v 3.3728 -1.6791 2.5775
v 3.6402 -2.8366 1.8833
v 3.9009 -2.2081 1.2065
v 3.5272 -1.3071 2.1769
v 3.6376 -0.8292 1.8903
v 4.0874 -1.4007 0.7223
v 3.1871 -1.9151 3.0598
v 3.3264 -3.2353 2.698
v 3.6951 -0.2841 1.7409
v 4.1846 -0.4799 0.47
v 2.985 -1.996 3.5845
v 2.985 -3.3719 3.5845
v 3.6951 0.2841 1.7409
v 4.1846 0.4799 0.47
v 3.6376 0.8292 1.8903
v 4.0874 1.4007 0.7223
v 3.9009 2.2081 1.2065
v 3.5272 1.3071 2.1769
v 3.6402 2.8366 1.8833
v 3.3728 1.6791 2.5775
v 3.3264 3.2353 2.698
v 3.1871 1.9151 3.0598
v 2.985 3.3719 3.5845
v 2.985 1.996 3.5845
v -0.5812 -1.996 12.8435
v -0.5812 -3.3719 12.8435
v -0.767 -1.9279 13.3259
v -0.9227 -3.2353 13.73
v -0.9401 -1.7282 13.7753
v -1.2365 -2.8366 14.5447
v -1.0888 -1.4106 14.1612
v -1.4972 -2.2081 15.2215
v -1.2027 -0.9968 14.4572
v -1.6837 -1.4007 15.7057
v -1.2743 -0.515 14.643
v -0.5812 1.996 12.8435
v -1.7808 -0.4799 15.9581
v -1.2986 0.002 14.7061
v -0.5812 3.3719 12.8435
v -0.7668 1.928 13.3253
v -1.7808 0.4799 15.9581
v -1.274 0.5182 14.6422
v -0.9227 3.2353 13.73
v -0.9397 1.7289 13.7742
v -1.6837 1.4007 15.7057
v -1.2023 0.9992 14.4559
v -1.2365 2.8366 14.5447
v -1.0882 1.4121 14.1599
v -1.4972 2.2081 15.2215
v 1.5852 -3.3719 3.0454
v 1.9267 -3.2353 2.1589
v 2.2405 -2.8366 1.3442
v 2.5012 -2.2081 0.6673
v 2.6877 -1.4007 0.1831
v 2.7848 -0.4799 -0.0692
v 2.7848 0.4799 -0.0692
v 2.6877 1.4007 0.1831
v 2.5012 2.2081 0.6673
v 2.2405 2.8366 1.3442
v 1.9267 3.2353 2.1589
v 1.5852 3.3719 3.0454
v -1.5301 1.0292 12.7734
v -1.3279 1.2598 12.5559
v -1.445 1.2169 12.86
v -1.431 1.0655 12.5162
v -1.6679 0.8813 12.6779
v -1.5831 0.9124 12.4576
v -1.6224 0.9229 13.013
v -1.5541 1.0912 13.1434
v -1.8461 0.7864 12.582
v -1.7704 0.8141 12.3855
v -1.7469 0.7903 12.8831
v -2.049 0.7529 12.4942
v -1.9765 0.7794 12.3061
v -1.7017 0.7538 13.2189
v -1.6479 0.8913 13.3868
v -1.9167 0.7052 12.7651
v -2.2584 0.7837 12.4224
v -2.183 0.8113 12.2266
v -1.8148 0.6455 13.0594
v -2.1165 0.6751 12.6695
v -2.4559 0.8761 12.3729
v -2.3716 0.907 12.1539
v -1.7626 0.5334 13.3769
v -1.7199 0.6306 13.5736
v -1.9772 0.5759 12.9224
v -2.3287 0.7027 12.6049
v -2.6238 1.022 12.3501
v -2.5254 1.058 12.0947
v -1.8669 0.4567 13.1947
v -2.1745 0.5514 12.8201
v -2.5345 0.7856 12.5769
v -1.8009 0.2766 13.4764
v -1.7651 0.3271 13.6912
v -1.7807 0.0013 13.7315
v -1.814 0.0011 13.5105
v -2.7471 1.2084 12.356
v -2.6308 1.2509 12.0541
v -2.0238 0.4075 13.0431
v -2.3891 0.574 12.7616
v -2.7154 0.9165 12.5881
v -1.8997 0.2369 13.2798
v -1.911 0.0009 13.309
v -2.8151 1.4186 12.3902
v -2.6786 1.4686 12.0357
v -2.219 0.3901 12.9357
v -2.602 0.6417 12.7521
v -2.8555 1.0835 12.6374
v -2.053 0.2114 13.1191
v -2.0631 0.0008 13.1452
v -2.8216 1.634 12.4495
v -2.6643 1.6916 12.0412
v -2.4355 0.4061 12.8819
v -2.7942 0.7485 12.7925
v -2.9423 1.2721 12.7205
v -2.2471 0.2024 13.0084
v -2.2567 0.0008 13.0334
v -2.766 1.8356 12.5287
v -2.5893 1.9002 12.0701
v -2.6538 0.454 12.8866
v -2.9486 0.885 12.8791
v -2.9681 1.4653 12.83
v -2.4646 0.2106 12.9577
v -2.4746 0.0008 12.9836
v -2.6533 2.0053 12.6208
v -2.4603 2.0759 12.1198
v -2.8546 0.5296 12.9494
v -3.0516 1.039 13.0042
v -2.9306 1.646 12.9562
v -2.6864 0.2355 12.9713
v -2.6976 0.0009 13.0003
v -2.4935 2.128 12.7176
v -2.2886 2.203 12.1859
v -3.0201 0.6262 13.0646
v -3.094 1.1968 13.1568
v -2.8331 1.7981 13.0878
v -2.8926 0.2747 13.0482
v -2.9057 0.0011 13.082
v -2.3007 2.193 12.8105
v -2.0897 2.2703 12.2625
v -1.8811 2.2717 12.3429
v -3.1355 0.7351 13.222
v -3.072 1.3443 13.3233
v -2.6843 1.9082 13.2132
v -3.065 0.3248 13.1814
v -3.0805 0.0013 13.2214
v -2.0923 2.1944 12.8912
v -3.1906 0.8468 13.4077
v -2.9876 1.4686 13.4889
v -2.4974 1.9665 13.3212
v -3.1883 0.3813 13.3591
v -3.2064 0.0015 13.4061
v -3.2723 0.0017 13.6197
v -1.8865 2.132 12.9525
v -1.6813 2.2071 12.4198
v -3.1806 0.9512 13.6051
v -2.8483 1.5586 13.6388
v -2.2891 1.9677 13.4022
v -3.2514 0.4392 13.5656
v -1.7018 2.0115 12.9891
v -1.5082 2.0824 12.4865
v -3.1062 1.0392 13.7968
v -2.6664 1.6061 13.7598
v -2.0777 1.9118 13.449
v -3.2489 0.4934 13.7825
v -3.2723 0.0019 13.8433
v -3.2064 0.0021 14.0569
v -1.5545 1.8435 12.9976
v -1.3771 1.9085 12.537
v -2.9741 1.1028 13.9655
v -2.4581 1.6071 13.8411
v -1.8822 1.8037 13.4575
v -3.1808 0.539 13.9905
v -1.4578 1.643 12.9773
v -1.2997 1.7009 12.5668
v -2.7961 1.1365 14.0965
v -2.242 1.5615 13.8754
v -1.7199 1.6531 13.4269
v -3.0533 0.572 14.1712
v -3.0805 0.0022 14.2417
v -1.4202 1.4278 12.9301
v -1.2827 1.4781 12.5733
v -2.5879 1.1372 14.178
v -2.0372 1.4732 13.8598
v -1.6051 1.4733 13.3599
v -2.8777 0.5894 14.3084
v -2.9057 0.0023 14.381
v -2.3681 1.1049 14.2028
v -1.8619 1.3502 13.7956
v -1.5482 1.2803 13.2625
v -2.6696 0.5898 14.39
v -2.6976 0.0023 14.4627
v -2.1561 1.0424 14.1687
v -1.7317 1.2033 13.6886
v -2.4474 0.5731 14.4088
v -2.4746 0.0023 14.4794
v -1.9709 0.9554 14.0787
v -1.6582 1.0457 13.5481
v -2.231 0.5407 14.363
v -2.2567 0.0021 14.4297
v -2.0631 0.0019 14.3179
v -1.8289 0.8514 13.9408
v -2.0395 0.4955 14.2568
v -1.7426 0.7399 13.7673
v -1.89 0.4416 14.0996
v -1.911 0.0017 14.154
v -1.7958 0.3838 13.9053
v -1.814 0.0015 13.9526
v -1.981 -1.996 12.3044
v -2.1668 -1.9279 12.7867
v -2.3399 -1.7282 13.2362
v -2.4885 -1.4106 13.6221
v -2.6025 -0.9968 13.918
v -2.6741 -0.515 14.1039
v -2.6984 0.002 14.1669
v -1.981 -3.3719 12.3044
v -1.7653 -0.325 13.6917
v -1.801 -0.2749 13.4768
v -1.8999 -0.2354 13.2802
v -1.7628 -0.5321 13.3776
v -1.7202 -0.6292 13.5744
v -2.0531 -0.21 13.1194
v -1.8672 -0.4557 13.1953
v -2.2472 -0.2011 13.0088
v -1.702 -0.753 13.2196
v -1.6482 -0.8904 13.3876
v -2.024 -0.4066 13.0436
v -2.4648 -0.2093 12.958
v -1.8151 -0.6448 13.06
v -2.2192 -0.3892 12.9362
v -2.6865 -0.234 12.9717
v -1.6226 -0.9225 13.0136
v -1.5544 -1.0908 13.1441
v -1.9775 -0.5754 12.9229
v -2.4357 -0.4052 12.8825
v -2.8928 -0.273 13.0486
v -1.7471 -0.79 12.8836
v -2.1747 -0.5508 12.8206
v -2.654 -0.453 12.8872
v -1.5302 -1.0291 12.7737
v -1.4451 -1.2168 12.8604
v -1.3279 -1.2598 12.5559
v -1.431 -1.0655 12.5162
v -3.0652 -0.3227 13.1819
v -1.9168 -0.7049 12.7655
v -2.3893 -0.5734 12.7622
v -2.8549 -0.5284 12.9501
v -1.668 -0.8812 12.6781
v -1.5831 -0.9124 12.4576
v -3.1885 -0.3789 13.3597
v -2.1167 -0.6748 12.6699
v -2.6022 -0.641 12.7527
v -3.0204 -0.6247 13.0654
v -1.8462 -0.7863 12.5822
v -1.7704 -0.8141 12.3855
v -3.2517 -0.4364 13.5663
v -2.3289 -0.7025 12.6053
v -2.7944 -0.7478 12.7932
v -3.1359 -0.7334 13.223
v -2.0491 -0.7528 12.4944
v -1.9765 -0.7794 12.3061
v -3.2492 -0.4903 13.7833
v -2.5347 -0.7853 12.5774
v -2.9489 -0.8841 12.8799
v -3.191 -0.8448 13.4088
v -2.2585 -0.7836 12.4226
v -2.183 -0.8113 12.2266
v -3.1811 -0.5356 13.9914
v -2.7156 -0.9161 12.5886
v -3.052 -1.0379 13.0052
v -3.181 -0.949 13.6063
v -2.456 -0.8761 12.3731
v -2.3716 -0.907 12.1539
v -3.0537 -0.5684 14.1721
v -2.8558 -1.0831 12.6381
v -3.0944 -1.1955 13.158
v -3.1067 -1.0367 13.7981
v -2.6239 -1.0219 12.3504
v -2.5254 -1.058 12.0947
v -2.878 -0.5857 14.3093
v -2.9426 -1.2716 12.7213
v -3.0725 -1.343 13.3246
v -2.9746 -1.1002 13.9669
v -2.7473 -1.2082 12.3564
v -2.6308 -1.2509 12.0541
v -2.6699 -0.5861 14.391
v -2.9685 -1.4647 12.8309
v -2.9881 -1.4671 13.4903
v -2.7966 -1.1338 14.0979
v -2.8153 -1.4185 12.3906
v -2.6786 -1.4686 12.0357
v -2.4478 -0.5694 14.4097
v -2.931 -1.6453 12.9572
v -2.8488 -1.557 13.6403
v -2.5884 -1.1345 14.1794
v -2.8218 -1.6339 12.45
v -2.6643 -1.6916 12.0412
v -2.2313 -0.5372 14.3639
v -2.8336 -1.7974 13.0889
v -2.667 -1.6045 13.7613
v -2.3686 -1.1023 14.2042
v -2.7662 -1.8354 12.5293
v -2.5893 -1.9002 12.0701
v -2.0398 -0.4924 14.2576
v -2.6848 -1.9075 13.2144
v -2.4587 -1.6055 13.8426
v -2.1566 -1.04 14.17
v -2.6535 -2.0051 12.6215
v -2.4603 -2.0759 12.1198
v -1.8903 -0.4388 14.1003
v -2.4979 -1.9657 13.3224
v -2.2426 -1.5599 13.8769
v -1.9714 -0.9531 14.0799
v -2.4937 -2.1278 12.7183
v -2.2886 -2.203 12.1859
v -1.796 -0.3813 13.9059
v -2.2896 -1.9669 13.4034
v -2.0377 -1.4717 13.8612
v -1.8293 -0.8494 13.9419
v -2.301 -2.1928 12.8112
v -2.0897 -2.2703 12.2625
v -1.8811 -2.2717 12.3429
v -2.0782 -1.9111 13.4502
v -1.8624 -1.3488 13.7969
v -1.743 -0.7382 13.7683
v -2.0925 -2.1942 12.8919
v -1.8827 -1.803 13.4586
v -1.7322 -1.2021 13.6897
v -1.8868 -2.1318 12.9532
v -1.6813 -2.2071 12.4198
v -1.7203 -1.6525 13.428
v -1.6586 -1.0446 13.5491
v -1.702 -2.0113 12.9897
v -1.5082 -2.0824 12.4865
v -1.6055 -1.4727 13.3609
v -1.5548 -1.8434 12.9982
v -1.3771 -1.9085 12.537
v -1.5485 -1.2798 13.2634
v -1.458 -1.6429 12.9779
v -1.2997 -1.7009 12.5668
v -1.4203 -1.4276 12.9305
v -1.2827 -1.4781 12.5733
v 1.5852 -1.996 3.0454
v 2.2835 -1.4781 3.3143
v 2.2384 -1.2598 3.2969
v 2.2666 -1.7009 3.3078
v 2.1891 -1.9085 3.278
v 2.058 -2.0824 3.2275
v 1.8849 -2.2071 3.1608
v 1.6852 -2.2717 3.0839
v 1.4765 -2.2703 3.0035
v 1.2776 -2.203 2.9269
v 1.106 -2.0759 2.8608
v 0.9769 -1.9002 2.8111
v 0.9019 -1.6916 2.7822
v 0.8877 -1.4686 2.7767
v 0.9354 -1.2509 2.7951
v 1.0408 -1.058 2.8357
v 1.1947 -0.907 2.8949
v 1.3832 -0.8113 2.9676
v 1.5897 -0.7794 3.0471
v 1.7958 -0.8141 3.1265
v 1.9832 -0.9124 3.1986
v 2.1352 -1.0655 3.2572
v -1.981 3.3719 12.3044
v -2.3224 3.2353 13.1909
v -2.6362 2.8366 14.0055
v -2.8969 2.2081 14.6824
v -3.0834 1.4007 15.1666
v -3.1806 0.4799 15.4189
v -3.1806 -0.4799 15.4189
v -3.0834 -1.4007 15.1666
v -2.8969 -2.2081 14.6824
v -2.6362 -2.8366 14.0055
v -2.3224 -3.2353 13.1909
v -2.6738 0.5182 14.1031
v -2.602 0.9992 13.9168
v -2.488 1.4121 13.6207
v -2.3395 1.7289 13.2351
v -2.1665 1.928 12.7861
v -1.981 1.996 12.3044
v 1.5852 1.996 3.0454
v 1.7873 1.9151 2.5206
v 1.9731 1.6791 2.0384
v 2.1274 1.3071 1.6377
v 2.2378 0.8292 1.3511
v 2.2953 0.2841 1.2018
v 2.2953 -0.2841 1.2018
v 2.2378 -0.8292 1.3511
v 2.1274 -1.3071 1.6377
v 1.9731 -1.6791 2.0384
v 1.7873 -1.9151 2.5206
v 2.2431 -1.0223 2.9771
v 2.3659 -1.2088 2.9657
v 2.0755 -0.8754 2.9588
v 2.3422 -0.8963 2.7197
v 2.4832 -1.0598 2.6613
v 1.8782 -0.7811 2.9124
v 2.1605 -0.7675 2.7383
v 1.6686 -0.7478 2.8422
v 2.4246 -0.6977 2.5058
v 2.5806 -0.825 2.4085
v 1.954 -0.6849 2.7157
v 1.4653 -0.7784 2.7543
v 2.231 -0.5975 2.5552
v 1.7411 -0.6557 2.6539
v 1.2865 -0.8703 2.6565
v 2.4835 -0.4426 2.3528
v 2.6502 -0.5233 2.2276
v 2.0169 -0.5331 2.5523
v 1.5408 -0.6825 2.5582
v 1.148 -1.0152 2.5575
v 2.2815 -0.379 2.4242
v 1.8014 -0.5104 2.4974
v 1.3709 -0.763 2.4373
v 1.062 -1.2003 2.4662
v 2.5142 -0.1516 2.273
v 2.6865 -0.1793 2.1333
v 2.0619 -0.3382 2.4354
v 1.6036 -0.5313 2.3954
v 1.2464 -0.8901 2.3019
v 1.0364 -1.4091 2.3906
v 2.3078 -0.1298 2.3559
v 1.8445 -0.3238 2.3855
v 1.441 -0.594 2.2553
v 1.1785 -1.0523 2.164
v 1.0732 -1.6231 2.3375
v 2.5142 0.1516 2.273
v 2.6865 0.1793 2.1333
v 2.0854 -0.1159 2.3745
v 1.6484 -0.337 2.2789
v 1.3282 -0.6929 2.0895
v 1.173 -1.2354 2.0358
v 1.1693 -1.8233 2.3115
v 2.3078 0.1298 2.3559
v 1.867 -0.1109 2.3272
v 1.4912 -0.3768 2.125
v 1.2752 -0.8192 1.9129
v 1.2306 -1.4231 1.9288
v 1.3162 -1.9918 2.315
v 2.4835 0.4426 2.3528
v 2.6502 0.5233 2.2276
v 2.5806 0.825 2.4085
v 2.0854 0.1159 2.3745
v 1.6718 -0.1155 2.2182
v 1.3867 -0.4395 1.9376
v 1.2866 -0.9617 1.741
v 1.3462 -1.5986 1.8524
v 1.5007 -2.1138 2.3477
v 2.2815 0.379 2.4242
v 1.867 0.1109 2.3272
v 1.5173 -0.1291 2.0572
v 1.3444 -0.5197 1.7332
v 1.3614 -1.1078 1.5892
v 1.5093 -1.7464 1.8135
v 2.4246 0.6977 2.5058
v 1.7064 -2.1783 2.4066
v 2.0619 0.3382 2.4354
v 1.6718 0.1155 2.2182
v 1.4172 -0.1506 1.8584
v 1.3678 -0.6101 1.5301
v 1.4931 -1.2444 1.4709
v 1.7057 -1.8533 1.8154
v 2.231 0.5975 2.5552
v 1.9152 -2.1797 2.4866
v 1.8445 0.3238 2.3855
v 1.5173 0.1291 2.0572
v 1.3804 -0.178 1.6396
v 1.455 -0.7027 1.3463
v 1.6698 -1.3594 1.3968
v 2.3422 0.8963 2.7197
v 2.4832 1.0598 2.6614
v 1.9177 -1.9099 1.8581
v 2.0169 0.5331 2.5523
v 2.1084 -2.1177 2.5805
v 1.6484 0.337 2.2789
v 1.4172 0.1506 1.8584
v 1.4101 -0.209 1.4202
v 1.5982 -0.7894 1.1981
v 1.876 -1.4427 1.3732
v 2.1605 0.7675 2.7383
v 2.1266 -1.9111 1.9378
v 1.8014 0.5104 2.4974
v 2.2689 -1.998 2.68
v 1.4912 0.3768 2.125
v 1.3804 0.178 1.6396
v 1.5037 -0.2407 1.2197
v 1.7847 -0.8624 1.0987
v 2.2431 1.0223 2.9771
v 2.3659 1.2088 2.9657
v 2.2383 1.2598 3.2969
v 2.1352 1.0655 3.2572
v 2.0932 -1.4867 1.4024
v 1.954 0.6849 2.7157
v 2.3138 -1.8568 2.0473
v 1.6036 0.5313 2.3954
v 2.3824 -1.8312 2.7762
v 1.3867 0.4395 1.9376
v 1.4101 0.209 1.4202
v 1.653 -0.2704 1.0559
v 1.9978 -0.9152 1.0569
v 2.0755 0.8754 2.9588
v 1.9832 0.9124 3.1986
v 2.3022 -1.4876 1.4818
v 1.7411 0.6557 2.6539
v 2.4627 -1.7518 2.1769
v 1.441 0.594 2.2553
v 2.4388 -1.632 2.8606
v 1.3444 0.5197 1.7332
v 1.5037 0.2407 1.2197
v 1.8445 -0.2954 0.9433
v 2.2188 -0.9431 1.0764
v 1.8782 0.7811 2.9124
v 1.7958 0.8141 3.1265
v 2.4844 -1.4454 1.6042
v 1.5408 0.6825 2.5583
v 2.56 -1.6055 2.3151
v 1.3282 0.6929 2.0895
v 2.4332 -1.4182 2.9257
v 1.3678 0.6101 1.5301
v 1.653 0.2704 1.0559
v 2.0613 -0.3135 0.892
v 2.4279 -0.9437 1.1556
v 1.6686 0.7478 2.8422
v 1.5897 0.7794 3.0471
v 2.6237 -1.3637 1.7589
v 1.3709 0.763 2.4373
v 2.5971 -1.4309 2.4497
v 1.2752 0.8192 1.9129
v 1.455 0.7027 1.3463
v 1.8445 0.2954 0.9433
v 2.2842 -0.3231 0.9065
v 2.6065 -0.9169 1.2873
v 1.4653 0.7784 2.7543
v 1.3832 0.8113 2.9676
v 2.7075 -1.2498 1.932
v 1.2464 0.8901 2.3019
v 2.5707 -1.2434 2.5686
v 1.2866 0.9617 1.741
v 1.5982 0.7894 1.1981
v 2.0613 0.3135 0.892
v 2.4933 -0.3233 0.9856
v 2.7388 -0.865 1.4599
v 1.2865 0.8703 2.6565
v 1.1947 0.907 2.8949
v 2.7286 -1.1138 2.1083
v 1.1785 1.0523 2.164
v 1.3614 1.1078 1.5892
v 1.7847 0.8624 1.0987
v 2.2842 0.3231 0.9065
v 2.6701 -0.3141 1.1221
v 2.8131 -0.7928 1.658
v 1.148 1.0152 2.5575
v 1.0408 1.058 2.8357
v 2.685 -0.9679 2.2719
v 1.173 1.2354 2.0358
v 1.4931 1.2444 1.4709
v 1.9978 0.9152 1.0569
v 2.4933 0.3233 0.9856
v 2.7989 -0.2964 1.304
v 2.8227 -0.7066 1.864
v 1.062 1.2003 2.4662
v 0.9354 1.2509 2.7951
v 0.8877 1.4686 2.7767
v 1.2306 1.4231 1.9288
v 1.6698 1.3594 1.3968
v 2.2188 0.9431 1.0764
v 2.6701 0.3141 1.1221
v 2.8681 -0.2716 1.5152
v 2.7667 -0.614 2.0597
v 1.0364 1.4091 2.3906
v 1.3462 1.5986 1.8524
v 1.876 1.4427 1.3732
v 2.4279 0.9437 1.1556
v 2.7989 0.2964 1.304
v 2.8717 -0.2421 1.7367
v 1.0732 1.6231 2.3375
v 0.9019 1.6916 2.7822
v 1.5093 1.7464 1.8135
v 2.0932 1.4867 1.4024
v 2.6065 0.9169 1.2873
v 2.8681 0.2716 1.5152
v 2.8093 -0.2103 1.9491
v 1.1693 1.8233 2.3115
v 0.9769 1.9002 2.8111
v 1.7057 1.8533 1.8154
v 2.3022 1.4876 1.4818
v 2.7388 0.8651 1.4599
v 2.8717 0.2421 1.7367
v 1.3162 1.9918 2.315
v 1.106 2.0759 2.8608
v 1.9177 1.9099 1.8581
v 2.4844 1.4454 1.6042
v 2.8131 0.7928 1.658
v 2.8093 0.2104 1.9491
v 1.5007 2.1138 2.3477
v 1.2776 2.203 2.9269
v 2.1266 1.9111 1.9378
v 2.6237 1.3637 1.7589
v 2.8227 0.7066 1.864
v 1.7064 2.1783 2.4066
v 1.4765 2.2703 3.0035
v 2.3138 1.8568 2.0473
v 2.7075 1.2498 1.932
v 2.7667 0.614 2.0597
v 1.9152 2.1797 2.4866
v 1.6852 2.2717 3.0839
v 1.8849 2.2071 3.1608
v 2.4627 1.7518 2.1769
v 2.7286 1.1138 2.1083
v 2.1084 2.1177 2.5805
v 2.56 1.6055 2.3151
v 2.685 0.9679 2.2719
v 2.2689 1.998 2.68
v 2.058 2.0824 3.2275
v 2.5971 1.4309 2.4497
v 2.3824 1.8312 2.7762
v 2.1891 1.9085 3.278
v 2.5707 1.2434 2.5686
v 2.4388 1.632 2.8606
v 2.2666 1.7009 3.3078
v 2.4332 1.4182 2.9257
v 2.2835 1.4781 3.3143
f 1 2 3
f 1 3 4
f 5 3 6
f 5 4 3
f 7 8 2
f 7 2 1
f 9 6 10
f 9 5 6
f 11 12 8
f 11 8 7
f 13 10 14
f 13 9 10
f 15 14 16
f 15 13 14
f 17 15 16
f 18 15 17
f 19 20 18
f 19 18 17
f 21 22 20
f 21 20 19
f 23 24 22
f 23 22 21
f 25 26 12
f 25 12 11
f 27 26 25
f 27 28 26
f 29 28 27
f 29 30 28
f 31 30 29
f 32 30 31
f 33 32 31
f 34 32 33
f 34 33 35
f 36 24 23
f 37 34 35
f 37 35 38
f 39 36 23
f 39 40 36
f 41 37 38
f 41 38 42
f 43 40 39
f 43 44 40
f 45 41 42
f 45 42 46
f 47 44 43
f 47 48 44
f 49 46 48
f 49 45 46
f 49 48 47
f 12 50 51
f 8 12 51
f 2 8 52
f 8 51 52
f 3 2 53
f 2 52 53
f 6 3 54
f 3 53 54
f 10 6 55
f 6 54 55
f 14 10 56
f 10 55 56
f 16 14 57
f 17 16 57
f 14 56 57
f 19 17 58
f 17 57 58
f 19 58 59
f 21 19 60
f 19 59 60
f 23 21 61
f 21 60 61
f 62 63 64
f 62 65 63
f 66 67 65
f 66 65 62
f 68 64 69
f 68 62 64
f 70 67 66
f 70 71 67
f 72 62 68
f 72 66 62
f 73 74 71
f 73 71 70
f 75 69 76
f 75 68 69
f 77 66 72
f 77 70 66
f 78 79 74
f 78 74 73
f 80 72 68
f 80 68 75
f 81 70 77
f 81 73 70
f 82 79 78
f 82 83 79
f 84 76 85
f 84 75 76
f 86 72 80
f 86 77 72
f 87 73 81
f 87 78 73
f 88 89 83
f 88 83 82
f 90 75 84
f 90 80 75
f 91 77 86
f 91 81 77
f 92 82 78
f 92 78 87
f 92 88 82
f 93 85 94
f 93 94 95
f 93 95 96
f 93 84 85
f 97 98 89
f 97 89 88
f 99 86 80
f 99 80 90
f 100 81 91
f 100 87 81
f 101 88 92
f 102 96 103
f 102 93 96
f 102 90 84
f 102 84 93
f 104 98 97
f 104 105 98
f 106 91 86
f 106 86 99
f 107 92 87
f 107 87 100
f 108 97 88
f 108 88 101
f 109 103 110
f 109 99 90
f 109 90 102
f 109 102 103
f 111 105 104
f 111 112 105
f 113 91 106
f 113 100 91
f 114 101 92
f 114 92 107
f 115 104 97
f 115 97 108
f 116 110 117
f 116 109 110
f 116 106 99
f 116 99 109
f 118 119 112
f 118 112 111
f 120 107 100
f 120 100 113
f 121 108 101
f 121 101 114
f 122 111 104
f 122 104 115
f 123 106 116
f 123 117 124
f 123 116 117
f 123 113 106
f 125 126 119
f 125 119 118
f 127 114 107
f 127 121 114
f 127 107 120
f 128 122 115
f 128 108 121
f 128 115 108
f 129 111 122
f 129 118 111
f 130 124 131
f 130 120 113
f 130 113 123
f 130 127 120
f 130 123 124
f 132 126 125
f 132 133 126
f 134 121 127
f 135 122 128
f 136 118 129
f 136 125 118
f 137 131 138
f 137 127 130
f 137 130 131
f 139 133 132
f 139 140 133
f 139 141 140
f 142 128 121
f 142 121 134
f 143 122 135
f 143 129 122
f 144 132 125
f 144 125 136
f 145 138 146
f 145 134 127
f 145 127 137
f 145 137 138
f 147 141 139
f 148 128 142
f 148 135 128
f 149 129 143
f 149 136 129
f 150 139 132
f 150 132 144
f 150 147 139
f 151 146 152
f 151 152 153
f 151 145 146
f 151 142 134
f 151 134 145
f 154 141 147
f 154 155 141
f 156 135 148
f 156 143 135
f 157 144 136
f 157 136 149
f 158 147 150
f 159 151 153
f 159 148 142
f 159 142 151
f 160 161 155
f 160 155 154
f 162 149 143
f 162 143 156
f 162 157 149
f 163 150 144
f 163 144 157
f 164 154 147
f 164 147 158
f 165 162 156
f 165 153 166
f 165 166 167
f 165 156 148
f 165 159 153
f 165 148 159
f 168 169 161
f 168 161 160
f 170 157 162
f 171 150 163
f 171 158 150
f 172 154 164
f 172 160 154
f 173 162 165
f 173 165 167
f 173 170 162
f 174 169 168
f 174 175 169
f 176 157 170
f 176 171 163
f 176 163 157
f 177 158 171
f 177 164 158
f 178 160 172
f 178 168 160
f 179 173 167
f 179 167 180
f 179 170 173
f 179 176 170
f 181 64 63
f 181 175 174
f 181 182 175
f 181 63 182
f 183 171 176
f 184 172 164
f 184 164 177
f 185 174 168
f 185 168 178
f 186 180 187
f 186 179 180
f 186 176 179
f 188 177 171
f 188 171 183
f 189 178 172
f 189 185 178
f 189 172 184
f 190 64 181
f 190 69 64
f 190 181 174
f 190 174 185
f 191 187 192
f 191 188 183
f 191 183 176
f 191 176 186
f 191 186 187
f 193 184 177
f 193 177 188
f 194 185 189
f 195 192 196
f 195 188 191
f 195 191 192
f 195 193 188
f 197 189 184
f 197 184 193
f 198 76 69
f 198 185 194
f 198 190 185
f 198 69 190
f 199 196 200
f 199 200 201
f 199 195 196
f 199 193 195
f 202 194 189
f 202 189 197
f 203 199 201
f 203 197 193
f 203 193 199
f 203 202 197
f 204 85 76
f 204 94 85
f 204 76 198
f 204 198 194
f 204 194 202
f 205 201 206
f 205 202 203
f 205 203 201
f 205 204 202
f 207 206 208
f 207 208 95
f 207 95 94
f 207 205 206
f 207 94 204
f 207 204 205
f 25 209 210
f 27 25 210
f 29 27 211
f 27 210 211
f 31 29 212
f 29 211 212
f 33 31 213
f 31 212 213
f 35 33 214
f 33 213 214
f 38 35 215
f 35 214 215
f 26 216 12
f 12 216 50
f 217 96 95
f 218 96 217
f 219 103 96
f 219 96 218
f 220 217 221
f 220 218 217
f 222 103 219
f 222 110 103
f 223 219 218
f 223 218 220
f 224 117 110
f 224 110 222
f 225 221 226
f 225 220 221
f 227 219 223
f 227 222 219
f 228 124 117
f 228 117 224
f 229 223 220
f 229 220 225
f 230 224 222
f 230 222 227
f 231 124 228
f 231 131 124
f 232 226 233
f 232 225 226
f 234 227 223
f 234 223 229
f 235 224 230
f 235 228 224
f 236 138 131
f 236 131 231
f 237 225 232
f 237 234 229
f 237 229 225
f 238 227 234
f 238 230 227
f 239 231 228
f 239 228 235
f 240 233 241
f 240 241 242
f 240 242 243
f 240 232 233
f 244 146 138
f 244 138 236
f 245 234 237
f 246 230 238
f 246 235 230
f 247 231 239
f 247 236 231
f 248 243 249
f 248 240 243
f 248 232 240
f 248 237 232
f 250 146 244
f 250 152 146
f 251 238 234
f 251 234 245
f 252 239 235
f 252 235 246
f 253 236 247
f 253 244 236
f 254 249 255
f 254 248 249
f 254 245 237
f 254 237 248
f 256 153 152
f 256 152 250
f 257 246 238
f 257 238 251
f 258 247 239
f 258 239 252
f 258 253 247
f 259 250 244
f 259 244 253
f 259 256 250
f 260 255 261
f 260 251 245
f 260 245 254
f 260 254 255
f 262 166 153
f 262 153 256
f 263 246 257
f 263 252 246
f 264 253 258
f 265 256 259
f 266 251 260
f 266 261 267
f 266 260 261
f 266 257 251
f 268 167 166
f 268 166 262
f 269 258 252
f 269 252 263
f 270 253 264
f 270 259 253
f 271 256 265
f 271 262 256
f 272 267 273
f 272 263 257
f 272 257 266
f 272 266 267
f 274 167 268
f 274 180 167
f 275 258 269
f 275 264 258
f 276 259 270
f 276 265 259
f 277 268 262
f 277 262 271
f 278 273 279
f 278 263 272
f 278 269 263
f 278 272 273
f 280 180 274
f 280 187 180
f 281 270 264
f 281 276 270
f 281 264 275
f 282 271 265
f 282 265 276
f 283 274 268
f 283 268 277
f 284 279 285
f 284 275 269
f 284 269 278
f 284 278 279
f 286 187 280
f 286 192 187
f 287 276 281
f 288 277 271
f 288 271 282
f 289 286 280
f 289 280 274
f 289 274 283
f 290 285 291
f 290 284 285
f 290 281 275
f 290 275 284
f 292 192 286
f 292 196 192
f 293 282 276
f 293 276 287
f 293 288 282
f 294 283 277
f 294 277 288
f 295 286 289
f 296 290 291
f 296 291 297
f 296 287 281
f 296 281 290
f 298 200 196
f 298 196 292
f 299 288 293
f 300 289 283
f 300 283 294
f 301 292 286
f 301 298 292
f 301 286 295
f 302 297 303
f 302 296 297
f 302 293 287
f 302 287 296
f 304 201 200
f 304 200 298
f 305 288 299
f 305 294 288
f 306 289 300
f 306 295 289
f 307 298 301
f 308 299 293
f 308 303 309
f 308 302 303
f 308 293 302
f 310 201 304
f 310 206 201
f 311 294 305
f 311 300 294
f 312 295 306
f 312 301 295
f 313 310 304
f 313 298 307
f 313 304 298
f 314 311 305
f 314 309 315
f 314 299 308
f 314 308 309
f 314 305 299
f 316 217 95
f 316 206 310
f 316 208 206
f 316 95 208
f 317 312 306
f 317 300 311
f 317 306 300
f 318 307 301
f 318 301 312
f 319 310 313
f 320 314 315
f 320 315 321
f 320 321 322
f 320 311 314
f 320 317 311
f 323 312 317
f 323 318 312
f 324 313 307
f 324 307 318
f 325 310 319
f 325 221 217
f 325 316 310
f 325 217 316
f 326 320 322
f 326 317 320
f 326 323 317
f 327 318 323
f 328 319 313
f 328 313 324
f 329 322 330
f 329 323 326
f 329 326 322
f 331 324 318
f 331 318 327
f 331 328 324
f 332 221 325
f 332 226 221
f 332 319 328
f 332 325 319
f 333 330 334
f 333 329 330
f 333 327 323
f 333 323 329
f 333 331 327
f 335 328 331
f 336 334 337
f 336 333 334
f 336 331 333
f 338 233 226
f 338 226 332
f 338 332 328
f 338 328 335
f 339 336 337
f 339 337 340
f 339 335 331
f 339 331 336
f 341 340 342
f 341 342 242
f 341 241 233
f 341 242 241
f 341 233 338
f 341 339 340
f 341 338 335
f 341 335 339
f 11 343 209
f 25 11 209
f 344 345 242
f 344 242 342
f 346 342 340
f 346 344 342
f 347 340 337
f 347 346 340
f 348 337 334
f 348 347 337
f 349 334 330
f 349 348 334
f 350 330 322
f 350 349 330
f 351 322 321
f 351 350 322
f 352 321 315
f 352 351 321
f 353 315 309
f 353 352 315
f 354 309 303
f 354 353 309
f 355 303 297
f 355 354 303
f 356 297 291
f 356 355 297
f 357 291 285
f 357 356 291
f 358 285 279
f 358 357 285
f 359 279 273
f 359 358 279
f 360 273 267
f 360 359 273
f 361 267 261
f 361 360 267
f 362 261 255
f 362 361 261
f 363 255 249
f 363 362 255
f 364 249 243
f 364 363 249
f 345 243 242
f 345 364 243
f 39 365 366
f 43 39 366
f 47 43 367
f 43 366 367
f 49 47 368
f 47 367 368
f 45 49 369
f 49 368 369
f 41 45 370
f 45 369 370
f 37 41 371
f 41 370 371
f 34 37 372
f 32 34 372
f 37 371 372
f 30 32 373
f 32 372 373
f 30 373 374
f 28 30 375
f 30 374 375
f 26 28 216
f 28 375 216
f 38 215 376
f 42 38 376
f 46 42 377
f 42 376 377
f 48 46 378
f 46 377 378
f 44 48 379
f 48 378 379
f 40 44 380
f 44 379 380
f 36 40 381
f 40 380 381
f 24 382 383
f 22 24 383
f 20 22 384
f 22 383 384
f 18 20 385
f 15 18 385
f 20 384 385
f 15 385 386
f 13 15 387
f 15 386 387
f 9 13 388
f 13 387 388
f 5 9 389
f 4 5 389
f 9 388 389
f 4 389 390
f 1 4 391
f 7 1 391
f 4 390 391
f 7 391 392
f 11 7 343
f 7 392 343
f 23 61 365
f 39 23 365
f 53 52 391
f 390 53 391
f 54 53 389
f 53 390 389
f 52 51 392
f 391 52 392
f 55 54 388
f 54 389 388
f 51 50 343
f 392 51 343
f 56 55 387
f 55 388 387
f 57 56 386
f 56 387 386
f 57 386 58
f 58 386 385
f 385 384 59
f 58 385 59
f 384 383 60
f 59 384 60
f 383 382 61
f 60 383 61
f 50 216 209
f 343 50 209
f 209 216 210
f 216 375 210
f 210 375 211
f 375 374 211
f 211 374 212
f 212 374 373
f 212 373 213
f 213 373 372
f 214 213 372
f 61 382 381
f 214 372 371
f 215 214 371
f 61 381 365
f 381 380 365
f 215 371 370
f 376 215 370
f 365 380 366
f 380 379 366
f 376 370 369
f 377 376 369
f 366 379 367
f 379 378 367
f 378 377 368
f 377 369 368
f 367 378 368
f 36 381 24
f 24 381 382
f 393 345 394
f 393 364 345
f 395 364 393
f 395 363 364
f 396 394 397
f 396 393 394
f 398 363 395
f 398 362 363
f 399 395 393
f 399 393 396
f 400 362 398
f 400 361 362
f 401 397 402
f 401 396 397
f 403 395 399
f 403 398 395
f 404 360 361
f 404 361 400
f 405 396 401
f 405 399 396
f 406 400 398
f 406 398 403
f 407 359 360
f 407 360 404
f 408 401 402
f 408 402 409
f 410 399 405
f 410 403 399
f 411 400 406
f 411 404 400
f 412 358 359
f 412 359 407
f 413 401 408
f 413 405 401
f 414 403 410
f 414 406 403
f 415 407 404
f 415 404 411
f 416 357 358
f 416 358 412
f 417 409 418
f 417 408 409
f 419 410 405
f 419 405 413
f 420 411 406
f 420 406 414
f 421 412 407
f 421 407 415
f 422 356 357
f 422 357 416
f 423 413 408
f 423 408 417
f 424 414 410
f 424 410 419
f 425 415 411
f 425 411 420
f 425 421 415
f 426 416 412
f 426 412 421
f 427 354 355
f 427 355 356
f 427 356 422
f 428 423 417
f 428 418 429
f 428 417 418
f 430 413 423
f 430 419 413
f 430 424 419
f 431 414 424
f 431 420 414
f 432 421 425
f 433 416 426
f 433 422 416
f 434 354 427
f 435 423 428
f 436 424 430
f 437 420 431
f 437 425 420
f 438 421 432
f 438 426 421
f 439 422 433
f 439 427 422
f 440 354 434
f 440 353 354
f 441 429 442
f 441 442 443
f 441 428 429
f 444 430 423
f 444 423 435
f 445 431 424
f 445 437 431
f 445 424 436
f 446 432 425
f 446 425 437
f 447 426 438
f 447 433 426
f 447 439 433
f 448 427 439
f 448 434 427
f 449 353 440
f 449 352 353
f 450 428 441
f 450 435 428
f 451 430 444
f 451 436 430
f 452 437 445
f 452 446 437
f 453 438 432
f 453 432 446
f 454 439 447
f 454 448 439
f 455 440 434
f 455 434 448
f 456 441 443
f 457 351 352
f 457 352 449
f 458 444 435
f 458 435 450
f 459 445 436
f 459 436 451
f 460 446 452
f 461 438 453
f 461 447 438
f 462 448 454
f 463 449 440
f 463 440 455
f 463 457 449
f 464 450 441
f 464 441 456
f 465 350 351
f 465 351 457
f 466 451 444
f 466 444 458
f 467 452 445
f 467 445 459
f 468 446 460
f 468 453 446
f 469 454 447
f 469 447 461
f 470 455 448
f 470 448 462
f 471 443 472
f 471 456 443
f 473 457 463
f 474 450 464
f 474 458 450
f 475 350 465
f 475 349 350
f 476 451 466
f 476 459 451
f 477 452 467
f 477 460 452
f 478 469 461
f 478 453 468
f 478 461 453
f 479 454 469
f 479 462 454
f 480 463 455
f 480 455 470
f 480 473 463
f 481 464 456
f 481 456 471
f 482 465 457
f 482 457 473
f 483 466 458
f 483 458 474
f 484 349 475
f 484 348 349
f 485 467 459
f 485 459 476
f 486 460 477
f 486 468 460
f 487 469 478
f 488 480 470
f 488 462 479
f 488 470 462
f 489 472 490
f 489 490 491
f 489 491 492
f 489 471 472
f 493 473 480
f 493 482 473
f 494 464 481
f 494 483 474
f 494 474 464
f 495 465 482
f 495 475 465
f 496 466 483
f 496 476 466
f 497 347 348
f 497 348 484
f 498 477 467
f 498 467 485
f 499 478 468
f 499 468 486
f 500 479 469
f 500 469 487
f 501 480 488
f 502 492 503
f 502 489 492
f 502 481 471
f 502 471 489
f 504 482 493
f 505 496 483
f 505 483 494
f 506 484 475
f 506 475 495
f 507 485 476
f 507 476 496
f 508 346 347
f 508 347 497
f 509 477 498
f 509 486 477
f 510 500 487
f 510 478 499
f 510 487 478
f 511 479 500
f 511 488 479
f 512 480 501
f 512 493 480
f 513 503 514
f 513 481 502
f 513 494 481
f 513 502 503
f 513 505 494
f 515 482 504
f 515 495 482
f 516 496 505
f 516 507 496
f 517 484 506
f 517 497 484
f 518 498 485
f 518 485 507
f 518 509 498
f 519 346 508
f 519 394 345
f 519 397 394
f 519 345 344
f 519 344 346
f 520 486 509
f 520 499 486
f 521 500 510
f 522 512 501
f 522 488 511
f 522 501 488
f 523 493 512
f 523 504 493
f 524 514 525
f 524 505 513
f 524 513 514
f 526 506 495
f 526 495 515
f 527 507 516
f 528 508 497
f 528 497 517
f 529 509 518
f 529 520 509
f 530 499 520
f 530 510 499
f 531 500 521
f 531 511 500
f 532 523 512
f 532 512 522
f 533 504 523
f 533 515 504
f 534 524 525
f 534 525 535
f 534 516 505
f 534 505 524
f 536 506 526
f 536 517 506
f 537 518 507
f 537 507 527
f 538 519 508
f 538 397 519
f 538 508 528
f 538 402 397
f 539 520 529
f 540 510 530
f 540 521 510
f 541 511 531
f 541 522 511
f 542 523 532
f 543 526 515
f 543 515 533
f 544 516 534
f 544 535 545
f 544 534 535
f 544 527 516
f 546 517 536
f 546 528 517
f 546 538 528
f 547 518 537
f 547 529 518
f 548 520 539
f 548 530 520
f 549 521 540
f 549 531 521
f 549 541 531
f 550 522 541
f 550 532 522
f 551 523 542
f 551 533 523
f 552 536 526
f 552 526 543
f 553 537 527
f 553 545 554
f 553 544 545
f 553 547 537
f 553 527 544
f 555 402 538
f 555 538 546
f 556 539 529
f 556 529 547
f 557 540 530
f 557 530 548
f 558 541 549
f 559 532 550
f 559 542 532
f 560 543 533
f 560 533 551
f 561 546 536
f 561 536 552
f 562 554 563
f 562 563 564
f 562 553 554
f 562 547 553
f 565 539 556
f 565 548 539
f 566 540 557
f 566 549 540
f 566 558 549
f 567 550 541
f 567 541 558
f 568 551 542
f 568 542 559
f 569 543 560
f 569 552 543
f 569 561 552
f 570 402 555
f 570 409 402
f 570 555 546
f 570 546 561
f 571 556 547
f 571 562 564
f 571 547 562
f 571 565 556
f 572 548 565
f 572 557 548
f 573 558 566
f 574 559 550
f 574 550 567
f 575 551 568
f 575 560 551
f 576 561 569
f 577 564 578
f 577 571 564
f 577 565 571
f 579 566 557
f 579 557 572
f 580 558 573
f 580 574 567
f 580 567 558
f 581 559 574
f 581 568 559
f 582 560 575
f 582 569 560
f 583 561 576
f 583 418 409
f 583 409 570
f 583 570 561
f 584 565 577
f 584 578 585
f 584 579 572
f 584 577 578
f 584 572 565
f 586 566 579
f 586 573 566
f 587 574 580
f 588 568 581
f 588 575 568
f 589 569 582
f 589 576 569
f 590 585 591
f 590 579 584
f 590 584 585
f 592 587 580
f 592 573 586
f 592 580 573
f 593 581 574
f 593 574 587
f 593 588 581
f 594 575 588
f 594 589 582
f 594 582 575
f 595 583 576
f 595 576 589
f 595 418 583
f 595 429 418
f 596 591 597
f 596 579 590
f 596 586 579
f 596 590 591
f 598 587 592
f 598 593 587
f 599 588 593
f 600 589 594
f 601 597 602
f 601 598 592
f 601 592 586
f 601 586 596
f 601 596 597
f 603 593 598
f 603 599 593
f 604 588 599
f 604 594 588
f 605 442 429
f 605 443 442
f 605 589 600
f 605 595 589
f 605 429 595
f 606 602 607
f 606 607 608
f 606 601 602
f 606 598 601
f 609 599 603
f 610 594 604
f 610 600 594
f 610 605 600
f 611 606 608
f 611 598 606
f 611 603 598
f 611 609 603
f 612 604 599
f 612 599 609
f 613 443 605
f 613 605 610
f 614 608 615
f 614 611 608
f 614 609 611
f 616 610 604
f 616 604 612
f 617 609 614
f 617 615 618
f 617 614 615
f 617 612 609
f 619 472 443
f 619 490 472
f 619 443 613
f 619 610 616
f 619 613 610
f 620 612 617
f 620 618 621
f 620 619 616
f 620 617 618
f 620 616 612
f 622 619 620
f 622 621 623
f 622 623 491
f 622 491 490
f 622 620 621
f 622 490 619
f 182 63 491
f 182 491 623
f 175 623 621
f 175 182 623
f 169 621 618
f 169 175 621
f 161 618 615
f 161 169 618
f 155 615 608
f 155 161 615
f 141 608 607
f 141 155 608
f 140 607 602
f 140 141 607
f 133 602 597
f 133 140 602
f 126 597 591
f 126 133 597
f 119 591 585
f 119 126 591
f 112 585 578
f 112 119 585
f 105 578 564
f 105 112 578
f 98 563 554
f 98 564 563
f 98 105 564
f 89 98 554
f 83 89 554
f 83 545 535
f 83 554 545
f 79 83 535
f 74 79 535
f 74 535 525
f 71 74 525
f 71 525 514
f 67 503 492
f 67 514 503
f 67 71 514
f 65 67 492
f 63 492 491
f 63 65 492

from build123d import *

# Parameters (mm, degrees)
F3_DEPTH = 1.5
F0_R     = 0.75


with BuildPart() as f3:
    # F2 (on face) → F3 (new body)
    with BuildSketch(Plane(origin=(2.401881, 0, 0.925115), x_dir=(0, 1, 0), z_dir=(0.933174, 0, 0.359424))):
        with BuildLine():
            ThreePointArc((3.371919, 12.194136), (0, 15.566055), (-3.371919, 12.194136))
            Line((-3.371919, 12.194136), (-3.371919, 2.272094))
            ThreePointArc((-3.371919, 2.272094), (0, -1.099825), (3.371919, 2.272094))
            Line((3.371919, 2.272094), (3.371919, 12.194136))
        make_face()
        with BuildLine():
            Line((-1.995956, 2.272094), (-1.995956, 12.194136))
            ThreePointArc((-1.995956, 12.194136), (-1.410634, 13.606209), (0.002035, 14.190091))
            ThreePointArc((0.002035, 14.190091), (1.412073, 13.60477), (1.995956, 12.194136))
            Line((1.995956, 12.194136), (1.995956, 2.272094))
            ThreePointArc((1.995956, 2.272094), (0, 0.276138), (-1.995956, 2.272094))
        make_face(mode=Mode.SUBTRACT)
    extrude(amount=F3_DEPTH)


with BuildPart() as f4:
    # F4: sweep along a path in F2
    with BuildLine(Plane(origin=(2.401881, 0, 0.925115), x_dir=(0, 1, 0), z_dir=(0.933174, 0, 0.359424))) as f4_path:
        ThreePointArc((1.995956, 12.194136), (1.412073, 13.60477), (0.002035, 14.190091))
        ThreePointArc((0.002035, 14.190091), (-1.410634, 13.606209), (-1.995956, 12.194136))
        Line((-1.995956, 12.194136), (-1.995956, 2.272094))
        ThreePointArc((-1.995956, 2.272094), (0, 0.276138), (1.995956, 2.272094))
        Line((1.995956, 2.272094), (1.995956, 12.194136))
    # F0 (on Front) → F4 (sweep)
    with BuildSketch(Plane.XZ):
        with Locations((-2.530671, 13.73153)):
            Circle(F0_R)
    sweep(path=f4_path.line)


solid = Compound([f3.part, f4.part])
